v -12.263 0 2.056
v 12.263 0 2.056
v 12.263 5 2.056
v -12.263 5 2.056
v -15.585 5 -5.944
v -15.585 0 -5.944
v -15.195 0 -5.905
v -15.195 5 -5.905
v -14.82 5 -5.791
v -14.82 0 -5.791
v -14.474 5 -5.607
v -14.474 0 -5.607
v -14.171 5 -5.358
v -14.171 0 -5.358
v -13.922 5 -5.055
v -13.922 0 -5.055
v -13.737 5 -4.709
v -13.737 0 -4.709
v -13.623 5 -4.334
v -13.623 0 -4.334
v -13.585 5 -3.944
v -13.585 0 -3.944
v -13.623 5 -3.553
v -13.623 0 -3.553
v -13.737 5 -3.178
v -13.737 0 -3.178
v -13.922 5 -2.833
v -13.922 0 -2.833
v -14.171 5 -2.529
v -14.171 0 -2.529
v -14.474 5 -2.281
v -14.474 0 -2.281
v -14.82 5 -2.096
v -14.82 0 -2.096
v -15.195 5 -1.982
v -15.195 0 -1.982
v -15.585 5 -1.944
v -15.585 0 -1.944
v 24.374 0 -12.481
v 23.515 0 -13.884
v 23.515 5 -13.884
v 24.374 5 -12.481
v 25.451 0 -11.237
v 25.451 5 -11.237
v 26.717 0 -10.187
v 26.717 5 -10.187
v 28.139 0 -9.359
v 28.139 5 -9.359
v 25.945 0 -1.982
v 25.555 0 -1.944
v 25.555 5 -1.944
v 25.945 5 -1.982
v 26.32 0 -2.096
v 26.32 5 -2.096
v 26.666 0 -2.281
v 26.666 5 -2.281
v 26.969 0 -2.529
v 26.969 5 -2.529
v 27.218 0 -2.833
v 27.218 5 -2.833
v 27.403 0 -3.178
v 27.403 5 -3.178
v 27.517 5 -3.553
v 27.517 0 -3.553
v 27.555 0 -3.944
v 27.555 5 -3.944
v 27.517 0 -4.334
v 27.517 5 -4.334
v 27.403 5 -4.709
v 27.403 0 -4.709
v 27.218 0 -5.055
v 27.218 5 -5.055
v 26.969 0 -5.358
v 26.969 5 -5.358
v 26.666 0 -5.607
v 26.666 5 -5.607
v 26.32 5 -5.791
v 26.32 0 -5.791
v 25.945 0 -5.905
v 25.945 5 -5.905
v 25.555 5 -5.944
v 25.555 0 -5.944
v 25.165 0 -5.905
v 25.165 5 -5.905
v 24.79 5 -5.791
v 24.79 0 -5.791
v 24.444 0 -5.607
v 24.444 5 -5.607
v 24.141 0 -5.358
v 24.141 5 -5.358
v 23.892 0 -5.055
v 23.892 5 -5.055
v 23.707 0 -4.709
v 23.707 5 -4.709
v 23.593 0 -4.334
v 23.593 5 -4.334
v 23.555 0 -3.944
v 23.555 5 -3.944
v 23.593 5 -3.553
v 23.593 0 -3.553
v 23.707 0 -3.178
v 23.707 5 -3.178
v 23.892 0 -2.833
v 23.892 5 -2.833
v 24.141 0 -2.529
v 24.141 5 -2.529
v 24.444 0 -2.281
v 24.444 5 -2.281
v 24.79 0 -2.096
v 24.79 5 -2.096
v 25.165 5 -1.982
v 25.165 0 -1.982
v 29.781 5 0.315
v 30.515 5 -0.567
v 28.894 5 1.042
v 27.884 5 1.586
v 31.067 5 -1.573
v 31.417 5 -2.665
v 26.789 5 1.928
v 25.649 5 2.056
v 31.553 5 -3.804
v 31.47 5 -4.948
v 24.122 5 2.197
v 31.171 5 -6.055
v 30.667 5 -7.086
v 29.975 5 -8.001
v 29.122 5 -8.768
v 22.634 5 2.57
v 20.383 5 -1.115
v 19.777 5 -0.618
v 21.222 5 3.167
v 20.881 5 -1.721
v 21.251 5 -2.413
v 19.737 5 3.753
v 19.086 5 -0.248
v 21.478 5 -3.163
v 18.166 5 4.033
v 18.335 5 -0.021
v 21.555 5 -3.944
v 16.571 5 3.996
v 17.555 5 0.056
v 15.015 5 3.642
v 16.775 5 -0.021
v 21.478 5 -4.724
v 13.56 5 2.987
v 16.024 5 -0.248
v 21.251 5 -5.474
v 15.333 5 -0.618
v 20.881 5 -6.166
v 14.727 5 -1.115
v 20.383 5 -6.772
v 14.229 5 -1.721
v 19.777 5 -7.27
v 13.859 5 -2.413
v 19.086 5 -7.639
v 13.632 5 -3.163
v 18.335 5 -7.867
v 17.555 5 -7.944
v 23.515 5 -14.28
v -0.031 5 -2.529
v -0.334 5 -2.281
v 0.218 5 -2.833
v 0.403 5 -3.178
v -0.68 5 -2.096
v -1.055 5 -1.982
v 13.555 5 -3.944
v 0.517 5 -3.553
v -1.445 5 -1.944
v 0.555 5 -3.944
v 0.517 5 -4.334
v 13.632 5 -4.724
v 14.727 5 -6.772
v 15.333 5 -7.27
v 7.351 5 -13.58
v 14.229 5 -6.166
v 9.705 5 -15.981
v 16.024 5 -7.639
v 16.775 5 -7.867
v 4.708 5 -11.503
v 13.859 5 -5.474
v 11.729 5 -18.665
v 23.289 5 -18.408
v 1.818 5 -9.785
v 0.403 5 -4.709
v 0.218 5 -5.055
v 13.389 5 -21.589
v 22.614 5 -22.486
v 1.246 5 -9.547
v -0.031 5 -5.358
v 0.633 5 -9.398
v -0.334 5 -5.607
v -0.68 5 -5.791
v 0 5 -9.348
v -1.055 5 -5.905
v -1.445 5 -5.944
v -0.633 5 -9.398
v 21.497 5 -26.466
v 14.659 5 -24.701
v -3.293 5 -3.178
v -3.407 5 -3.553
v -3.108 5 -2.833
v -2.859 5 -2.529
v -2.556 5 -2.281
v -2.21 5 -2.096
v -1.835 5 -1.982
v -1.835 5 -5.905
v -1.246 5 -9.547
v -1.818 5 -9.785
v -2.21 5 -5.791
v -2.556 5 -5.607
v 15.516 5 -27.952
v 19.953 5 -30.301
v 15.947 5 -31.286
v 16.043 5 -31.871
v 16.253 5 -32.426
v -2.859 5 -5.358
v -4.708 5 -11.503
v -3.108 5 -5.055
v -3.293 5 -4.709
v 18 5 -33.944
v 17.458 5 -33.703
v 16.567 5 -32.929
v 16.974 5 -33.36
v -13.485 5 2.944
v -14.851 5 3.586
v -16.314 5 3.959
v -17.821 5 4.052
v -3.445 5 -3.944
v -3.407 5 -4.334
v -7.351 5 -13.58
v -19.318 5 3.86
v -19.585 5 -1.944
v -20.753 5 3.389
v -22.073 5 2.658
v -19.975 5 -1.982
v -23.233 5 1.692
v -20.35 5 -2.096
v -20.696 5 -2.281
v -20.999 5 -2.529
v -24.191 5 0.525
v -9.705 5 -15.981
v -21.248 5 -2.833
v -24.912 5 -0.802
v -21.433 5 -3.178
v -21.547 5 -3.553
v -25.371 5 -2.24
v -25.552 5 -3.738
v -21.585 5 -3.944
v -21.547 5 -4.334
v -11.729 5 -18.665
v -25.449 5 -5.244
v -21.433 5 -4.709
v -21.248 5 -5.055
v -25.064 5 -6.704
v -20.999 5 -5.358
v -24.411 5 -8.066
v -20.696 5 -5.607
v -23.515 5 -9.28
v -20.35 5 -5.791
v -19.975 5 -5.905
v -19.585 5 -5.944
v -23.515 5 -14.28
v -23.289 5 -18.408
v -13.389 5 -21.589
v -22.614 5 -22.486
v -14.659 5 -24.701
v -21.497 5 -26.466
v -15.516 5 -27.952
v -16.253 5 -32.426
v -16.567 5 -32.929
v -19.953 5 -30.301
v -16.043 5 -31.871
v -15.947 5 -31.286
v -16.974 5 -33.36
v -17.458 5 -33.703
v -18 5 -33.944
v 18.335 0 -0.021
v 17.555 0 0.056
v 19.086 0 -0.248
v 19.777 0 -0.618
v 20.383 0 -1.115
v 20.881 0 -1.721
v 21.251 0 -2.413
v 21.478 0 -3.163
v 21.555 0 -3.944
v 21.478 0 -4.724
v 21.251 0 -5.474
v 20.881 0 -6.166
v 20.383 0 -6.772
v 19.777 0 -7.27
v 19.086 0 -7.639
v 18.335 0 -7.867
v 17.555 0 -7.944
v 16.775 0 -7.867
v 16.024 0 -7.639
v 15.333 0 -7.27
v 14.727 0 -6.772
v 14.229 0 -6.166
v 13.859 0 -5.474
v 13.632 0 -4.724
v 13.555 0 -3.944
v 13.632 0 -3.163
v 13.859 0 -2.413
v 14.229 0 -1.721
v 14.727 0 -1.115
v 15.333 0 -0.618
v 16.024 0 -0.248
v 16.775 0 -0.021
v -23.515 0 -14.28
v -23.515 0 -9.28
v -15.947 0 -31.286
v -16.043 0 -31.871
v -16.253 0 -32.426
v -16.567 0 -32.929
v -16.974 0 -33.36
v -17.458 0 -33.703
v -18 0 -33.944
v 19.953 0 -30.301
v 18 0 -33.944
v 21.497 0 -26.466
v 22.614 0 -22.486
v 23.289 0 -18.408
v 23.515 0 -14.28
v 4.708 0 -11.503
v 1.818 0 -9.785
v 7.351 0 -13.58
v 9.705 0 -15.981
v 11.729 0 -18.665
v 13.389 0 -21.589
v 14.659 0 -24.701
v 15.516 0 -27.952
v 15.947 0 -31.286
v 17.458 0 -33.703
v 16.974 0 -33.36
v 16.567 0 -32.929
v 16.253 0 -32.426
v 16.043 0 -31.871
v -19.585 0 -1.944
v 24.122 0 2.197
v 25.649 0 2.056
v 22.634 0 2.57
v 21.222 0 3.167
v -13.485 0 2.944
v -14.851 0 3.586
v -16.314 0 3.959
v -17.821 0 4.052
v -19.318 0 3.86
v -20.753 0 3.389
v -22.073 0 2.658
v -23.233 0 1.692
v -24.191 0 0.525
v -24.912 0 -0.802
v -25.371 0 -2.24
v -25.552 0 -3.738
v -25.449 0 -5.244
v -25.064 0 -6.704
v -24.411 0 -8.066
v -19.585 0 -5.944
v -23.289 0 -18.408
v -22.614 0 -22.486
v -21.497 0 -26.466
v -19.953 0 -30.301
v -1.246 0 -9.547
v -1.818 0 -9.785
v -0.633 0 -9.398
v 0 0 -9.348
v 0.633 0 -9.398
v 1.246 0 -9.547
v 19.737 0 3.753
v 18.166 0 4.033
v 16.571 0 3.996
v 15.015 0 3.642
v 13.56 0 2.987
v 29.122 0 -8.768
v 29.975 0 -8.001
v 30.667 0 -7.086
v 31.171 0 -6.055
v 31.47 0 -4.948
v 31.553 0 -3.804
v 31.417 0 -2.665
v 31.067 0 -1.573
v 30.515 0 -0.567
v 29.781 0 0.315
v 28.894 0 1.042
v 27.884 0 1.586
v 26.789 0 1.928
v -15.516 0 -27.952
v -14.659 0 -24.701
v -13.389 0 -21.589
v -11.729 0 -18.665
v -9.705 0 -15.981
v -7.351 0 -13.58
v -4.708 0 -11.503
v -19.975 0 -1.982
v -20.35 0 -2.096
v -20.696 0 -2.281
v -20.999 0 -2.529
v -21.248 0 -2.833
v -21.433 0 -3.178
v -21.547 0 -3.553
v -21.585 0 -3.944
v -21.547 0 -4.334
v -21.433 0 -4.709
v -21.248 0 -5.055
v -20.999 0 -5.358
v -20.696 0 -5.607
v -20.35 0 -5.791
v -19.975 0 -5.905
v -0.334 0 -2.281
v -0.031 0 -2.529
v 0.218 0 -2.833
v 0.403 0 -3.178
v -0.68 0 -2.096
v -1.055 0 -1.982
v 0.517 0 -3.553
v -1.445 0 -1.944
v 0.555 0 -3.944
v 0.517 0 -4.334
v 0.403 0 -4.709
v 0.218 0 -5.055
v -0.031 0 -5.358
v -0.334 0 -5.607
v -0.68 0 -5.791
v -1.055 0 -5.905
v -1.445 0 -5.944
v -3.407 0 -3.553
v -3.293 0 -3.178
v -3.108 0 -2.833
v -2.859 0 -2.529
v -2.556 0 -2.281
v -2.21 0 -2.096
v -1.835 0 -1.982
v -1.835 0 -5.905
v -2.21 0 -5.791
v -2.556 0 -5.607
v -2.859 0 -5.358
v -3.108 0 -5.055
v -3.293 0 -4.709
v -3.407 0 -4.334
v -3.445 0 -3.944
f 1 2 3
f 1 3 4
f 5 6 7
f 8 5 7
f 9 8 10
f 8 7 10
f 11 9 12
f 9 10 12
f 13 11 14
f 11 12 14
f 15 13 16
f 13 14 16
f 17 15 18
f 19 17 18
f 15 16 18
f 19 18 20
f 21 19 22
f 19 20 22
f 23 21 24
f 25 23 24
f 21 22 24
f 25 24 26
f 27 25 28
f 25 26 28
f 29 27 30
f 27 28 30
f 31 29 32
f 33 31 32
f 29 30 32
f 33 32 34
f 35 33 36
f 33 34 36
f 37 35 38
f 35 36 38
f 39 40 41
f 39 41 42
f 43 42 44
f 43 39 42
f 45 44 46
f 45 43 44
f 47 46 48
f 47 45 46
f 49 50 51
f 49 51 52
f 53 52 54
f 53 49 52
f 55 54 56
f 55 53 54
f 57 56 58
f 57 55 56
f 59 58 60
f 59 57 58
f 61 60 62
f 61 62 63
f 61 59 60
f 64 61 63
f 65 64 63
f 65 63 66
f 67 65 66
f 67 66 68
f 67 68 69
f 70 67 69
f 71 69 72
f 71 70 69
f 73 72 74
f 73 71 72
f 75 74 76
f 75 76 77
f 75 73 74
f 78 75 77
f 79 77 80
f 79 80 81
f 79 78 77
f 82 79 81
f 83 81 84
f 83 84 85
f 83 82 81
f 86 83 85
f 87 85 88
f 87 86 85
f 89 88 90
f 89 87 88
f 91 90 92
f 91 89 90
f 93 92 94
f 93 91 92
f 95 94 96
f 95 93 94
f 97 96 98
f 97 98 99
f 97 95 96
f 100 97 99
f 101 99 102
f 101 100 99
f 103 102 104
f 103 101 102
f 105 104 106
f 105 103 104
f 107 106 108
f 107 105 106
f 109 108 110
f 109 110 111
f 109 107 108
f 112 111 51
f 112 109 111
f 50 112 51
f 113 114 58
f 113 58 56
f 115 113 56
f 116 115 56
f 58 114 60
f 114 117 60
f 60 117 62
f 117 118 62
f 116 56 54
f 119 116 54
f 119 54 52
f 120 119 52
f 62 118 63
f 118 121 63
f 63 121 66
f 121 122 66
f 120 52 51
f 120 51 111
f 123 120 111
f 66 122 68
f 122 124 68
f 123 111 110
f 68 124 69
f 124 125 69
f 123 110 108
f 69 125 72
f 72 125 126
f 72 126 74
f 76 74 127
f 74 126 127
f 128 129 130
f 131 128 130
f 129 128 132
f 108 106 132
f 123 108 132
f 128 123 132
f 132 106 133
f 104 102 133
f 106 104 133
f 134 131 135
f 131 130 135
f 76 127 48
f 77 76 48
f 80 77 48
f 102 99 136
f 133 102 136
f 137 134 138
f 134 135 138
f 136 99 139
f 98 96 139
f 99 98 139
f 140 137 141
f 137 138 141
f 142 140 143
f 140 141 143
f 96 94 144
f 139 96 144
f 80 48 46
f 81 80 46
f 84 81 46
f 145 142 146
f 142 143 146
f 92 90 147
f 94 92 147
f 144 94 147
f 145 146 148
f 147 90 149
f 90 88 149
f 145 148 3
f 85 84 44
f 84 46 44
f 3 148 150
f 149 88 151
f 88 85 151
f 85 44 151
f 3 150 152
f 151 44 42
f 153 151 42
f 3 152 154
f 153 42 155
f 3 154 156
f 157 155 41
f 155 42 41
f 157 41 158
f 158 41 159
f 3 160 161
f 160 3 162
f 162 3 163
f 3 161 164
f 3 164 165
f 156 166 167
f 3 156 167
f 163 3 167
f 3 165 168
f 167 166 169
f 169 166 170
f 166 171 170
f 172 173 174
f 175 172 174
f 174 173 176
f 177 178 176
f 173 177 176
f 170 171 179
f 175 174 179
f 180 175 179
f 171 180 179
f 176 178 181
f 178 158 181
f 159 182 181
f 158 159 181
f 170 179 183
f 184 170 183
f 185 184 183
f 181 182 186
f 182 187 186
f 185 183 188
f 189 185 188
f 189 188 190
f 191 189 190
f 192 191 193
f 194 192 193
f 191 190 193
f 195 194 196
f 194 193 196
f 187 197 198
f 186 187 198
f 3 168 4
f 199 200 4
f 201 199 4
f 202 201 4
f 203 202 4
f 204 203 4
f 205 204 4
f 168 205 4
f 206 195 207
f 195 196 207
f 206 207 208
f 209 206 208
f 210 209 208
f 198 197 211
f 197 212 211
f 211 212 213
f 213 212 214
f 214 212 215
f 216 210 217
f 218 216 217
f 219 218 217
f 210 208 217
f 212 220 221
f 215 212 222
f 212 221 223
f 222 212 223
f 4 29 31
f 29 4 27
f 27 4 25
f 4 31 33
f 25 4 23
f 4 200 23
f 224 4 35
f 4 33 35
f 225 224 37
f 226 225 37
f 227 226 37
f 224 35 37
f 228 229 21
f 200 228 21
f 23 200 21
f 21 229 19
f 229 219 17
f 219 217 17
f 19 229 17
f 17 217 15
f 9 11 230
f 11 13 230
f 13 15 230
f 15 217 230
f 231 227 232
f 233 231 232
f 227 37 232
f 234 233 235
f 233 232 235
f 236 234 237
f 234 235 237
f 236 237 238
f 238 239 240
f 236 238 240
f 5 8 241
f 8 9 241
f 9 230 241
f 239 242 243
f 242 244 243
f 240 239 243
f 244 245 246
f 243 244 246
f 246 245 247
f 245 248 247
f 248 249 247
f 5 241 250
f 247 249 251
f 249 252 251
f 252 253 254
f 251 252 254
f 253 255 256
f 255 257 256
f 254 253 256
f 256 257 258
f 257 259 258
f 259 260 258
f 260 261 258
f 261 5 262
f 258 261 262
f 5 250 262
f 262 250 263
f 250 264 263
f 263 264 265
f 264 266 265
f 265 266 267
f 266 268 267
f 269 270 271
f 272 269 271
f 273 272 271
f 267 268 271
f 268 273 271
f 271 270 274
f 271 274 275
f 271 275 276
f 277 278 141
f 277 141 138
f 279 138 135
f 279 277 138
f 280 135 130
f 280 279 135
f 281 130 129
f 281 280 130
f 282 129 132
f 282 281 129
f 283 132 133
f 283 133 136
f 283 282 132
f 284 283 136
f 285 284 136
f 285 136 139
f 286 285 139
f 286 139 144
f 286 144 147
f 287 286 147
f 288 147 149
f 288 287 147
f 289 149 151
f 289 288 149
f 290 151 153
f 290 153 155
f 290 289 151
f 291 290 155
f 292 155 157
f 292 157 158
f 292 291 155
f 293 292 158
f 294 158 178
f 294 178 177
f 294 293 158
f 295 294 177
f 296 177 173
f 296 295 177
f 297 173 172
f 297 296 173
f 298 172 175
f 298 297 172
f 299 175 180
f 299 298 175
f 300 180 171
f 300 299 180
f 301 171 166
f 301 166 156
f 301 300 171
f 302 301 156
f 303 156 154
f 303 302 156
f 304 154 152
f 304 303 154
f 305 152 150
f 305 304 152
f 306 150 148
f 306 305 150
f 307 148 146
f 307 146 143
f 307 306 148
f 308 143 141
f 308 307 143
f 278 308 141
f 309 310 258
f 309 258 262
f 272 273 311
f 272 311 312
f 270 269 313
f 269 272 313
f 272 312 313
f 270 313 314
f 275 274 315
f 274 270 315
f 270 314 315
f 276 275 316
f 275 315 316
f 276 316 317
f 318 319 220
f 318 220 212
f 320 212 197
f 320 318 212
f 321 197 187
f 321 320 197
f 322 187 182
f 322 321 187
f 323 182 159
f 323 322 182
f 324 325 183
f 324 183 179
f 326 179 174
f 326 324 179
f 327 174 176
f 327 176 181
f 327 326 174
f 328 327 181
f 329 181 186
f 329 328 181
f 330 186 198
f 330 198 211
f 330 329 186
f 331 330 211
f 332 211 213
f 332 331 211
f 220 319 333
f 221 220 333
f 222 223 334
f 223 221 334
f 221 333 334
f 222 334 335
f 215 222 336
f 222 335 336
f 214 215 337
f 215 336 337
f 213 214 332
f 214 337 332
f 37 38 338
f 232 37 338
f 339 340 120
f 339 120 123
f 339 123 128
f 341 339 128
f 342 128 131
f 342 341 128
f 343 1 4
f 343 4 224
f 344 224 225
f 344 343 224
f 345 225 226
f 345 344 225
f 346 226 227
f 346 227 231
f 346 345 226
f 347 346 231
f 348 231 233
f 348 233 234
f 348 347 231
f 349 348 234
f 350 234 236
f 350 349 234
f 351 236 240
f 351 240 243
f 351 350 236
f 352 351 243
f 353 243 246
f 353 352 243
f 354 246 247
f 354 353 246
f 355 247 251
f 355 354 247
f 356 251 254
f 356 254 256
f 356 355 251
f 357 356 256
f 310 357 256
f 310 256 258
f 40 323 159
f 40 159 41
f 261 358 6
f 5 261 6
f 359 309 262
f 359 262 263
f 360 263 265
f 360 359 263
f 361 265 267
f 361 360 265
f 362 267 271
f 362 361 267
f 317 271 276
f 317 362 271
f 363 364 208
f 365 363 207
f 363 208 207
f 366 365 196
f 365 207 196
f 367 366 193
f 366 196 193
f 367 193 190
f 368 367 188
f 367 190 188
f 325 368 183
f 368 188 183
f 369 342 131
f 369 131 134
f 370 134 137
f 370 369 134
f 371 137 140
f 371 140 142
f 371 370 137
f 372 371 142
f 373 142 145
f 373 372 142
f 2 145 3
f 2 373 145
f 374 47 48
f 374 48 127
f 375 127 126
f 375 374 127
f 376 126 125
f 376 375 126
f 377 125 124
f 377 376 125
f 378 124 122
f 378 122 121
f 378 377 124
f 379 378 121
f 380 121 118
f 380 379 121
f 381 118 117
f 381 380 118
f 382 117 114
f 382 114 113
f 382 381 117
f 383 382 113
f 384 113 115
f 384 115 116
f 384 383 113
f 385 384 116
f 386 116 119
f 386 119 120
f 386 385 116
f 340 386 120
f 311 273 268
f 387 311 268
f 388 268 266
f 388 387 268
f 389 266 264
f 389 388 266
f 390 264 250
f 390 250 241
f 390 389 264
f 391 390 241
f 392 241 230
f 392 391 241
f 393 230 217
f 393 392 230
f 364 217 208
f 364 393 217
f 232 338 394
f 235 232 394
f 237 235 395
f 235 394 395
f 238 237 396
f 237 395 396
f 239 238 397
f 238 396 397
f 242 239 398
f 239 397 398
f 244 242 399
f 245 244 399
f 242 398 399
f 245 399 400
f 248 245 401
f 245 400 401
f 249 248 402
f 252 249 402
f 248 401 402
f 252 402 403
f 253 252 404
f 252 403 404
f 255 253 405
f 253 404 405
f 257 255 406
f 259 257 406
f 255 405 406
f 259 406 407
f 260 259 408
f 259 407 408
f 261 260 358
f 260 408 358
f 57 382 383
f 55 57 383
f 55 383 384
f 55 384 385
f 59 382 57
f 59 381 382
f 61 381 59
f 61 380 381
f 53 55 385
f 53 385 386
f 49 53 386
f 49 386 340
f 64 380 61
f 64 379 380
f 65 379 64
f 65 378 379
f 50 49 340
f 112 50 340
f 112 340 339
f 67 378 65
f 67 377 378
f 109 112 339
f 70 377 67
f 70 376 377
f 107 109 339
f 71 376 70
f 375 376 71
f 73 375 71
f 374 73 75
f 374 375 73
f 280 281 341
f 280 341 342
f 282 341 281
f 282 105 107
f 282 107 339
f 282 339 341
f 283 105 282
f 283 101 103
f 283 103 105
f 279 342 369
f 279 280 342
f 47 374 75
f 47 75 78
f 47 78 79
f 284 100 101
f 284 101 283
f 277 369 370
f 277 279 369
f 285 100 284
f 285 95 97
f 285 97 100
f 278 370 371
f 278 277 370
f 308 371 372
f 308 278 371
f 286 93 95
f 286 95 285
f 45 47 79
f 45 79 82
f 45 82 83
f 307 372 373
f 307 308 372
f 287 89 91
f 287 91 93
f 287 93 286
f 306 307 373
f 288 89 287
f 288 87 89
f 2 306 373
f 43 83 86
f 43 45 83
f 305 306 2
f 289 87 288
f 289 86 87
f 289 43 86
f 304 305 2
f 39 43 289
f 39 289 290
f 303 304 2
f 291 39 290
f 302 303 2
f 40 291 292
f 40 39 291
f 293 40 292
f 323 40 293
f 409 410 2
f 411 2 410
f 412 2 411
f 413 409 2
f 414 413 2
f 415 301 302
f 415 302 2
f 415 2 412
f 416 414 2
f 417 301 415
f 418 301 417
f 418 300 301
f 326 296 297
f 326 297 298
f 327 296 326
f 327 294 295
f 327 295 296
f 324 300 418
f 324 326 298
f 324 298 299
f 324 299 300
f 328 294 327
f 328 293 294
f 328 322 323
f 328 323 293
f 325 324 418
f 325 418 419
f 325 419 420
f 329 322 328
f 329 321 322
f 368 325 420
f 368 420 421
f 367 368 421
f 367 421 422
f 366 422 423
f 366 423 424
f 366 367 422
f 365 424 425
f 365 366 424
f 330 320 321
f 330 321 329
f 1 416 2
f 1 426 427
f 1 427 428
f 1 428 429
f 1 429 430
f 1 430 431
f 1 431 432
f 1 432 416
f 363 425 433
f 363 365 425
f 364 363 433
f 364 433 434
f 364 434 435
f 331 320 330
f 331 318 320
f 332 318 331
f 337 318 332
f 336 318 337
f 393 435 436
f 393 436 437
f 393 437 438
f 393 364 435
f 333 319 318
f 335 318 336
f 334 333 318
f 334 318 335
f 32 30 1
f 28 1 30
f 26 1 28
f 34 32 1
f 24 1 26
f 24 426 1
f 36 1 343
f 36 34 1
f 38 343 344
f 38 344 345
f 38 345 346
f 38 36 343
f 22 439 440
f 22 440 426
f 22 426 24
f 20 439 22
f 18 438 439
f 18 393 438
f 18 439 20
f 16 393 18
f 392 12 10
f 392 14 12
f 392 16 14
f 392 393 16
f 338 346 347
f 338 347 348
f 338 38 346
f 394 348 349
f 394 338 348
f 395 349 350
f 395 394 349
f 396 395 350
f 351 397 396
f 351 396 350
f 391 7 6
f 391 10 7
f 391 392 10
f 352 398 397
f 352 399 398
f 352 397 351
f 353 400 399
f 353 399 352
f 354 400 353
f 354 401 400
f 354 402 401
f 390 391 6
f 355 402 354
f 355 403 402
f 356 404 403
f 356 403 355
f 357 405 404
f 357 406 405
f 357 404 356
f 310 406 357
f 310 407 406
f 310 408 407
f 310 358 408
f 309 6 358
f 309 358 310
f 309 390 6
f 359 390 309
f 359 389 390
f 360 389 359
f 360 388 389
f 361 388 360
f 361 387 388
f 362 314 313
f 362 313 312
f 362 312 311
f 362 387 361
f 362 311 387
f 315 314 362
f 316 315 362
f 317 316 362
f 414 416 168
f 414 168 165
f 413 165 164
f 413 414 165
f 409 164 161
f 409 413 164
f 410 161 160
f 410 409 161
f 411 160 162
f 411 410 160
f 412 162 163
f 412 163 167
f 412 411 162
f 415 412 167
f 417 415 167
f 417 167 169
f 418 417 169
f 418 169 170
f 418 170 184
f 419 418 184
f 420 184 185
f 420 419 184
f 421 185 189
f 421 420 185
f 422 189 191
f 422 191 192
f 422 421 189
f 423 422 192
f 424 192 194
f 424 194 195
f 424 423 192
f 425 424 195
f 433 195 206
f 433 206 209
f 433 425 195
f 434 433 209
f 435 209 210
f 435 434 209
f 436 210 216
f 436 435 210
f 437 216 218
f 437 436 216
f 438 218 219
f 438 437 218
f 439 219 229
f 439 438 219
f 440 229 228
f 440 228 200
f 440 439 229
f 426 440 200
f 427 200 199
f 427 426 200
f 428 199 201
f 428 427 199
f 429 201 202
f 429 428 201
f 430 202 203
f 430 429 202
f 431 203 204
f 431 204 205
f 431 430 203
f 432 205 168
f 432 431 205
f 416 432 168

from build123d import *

# Parameters (mm, degrees)
SKETCH1_R           = 4
SKETCH1_R_2         = 2
BOSS_EXTRUDE1_DEPTH = 5
FILLET1_R           = 4
FILLET2_R           = 3
FILLET3_R           = 3


with BuildPart() as part:
    # Sketch1 → Boss-Extrude1 (new body)
    with BuildSketch(Plane(origin=(0, 0, 0), x_dir=(1, 0, 0), z_dir=(0, 1, 0))):
        with BuildLine():
            Line((-16, 33.943656531), (-16, 32.943656531))
            ThreePointArc((-16, 32.943656531), (-11.633307653, 18.521451429), (0, 8.943656531))
            ThreePointArc((0, 8.943656531), (11.633307653, 18.521451429), (16, 32.943656531))
            Line((16, 32.943656531), (16, 33.943656531))
            Line((16, 33.943656531), (18, 33.943656531))
            ThreePointArc((18, 33.943656531), (22.110006153, 24.491379681), (23.514801823, 14.280393571))
            Line((23.514801823, 14.280393571), (23.514801823, 13.884283426))
            ThreePointArc((23.514801823, 13.884283426), (25.450700755, 11.237241369), (28.138825911, 9.35880599))
            ThreePointArc((28.138825911, 9.35880599), (31.417131183, 2.664821909), (25.64875, -2.055611002))
            ThreePointArc((25.64875, -2.055611002), (23.370974699, -2.355136602), (21.221666667, -3.166586471))
            ThreePointArc((21.221666667, -3.166586471), (16.57103717, -3.995601441), (12.263497378, -2.056343469))
            Line((12.263497378, -2.056343469), (-12.263497378, -2.056343469))
            ThreePointArc((-12.263497378, -2.056343469), (-23.233209016, -1.691762031), (-23.514801823, 9.280393571))
            Line((-23.514801823, 9.280393571), (-23.514801823, 14.280393571))
            ThreePointArc((-23.514801823, 14.280393571), (-22.110006153, 24.491379681), (-18, 33.943656531))
            Line((-18, 33.943656531), (-16, 33.943656531))
        make_face()
        with Locations(Location((17.555, 3.943656531, 0), (0, 0, 270))):
            Circle(SKETCH1_R, mode=Mode.SUBTRACT)
        with Locations(Location((25.555, 3.943656531, 0), (0, 0, 270))):
            Circle(SKETCH1_R_2, mode=Mode.SUBTRACT)
        with Locations(Location((-1.445, 3.943656531, 0), (0, 0, 270))):
            Circle(SKETCH1_R_2, mode=Mode.SUBTRACT)
        with BuildLine():
            Line((-19.585, 5.943656531), (-15.585, 5.943656531))
            ThreePointArc((-15.585, 5.943656531), (-13.585, 3.943656531), (-15.585, 1.943656531))
            Line((-15.585, 1.943656531), (-19.585, 1.943656531))
            ThreePointArc((-19.585, 1.943656531), (-21.585, 3.943656531), (-19.585, 5.943656531))
        make_face(mode=Mode.SUBTRACT)
    extrude(amount=BOSS_EXTRUDE1_DEPTH)

    # Fillet1
    fillet1_edges = [part.edges().sort_by_distance(p)[0] for p in [
        (0, 2.5, -8.943656531),
    ]]
    fillet(fillet1_edges, radius=FILLET1_R)

    # Fillet2
    # the kernel refuses this fillet: 3 mm, written as the material it takes off along each edge
    with BuildSketch(Plane(origin=(-16, -6.644712065, -33.943656531), x_dir=(0.019894609369720675, 0, 0.999802082673379), z_dir=(0, 1, 0))) as fillet2_piece_1:
        with BuildLine():
            CenterArc((2.789518237, -2.997110716), FILLET2_R, 92.514820362, 68.064461233)
            Line((-0.039789219, -1.999604165), (-0.322719964, -1.89985351))
            ThreePointArc((-0.322719964, -1.89985351), (-0.319835234, -0.9938337), (-0.299940625, 0.005968383))
            Line((-0.299940625, 0.005968383), (0.005968383, 0.299940625))
            ThreePointArc((0.005968383, 0.299940625), (1.005770465, 0.280046015), (2.644721485, 0.299711072))
            Line((2.644721485, 0.299711072), (2.657884826, 0))
        make_face()
    extrude(amount=18.289424129, mode=Mode.SUBTRACT)

    # Fillet3
    # the kernel refuses this fillet: 3 mm, written as the material it takes off along each edge
    with BuildSketch(Plane(origin=(16, -6.644712065, -33.943656531), x_dir=(1, 0, 0), z_dir=(0, 1, 0))) as fillet3_piece_1:
        with BuildLine():
            CenterArc((2.94102116, -2.84859249), FILLET3_R, 108.280766047, 68.064461233)
            Line((-0.05287758, -2.657358784), (-0.352267454, -2.638235414))
            ThreePointArc((-0.352267454, -2.638235414), (-0.3, -1), (-0.3, 0))
            Line((-0.3, 0), (0, 0.3))
            ThreePointArc((0, 0.3), (1, 0.3), (1.905897884, 0.284859249))
            Line((1.905897884, 0.284859249), (2, 0))
        make_face()
    extrude(amount=18.289424129, mode=Mode.SUBTRACT)


solid = part.part
